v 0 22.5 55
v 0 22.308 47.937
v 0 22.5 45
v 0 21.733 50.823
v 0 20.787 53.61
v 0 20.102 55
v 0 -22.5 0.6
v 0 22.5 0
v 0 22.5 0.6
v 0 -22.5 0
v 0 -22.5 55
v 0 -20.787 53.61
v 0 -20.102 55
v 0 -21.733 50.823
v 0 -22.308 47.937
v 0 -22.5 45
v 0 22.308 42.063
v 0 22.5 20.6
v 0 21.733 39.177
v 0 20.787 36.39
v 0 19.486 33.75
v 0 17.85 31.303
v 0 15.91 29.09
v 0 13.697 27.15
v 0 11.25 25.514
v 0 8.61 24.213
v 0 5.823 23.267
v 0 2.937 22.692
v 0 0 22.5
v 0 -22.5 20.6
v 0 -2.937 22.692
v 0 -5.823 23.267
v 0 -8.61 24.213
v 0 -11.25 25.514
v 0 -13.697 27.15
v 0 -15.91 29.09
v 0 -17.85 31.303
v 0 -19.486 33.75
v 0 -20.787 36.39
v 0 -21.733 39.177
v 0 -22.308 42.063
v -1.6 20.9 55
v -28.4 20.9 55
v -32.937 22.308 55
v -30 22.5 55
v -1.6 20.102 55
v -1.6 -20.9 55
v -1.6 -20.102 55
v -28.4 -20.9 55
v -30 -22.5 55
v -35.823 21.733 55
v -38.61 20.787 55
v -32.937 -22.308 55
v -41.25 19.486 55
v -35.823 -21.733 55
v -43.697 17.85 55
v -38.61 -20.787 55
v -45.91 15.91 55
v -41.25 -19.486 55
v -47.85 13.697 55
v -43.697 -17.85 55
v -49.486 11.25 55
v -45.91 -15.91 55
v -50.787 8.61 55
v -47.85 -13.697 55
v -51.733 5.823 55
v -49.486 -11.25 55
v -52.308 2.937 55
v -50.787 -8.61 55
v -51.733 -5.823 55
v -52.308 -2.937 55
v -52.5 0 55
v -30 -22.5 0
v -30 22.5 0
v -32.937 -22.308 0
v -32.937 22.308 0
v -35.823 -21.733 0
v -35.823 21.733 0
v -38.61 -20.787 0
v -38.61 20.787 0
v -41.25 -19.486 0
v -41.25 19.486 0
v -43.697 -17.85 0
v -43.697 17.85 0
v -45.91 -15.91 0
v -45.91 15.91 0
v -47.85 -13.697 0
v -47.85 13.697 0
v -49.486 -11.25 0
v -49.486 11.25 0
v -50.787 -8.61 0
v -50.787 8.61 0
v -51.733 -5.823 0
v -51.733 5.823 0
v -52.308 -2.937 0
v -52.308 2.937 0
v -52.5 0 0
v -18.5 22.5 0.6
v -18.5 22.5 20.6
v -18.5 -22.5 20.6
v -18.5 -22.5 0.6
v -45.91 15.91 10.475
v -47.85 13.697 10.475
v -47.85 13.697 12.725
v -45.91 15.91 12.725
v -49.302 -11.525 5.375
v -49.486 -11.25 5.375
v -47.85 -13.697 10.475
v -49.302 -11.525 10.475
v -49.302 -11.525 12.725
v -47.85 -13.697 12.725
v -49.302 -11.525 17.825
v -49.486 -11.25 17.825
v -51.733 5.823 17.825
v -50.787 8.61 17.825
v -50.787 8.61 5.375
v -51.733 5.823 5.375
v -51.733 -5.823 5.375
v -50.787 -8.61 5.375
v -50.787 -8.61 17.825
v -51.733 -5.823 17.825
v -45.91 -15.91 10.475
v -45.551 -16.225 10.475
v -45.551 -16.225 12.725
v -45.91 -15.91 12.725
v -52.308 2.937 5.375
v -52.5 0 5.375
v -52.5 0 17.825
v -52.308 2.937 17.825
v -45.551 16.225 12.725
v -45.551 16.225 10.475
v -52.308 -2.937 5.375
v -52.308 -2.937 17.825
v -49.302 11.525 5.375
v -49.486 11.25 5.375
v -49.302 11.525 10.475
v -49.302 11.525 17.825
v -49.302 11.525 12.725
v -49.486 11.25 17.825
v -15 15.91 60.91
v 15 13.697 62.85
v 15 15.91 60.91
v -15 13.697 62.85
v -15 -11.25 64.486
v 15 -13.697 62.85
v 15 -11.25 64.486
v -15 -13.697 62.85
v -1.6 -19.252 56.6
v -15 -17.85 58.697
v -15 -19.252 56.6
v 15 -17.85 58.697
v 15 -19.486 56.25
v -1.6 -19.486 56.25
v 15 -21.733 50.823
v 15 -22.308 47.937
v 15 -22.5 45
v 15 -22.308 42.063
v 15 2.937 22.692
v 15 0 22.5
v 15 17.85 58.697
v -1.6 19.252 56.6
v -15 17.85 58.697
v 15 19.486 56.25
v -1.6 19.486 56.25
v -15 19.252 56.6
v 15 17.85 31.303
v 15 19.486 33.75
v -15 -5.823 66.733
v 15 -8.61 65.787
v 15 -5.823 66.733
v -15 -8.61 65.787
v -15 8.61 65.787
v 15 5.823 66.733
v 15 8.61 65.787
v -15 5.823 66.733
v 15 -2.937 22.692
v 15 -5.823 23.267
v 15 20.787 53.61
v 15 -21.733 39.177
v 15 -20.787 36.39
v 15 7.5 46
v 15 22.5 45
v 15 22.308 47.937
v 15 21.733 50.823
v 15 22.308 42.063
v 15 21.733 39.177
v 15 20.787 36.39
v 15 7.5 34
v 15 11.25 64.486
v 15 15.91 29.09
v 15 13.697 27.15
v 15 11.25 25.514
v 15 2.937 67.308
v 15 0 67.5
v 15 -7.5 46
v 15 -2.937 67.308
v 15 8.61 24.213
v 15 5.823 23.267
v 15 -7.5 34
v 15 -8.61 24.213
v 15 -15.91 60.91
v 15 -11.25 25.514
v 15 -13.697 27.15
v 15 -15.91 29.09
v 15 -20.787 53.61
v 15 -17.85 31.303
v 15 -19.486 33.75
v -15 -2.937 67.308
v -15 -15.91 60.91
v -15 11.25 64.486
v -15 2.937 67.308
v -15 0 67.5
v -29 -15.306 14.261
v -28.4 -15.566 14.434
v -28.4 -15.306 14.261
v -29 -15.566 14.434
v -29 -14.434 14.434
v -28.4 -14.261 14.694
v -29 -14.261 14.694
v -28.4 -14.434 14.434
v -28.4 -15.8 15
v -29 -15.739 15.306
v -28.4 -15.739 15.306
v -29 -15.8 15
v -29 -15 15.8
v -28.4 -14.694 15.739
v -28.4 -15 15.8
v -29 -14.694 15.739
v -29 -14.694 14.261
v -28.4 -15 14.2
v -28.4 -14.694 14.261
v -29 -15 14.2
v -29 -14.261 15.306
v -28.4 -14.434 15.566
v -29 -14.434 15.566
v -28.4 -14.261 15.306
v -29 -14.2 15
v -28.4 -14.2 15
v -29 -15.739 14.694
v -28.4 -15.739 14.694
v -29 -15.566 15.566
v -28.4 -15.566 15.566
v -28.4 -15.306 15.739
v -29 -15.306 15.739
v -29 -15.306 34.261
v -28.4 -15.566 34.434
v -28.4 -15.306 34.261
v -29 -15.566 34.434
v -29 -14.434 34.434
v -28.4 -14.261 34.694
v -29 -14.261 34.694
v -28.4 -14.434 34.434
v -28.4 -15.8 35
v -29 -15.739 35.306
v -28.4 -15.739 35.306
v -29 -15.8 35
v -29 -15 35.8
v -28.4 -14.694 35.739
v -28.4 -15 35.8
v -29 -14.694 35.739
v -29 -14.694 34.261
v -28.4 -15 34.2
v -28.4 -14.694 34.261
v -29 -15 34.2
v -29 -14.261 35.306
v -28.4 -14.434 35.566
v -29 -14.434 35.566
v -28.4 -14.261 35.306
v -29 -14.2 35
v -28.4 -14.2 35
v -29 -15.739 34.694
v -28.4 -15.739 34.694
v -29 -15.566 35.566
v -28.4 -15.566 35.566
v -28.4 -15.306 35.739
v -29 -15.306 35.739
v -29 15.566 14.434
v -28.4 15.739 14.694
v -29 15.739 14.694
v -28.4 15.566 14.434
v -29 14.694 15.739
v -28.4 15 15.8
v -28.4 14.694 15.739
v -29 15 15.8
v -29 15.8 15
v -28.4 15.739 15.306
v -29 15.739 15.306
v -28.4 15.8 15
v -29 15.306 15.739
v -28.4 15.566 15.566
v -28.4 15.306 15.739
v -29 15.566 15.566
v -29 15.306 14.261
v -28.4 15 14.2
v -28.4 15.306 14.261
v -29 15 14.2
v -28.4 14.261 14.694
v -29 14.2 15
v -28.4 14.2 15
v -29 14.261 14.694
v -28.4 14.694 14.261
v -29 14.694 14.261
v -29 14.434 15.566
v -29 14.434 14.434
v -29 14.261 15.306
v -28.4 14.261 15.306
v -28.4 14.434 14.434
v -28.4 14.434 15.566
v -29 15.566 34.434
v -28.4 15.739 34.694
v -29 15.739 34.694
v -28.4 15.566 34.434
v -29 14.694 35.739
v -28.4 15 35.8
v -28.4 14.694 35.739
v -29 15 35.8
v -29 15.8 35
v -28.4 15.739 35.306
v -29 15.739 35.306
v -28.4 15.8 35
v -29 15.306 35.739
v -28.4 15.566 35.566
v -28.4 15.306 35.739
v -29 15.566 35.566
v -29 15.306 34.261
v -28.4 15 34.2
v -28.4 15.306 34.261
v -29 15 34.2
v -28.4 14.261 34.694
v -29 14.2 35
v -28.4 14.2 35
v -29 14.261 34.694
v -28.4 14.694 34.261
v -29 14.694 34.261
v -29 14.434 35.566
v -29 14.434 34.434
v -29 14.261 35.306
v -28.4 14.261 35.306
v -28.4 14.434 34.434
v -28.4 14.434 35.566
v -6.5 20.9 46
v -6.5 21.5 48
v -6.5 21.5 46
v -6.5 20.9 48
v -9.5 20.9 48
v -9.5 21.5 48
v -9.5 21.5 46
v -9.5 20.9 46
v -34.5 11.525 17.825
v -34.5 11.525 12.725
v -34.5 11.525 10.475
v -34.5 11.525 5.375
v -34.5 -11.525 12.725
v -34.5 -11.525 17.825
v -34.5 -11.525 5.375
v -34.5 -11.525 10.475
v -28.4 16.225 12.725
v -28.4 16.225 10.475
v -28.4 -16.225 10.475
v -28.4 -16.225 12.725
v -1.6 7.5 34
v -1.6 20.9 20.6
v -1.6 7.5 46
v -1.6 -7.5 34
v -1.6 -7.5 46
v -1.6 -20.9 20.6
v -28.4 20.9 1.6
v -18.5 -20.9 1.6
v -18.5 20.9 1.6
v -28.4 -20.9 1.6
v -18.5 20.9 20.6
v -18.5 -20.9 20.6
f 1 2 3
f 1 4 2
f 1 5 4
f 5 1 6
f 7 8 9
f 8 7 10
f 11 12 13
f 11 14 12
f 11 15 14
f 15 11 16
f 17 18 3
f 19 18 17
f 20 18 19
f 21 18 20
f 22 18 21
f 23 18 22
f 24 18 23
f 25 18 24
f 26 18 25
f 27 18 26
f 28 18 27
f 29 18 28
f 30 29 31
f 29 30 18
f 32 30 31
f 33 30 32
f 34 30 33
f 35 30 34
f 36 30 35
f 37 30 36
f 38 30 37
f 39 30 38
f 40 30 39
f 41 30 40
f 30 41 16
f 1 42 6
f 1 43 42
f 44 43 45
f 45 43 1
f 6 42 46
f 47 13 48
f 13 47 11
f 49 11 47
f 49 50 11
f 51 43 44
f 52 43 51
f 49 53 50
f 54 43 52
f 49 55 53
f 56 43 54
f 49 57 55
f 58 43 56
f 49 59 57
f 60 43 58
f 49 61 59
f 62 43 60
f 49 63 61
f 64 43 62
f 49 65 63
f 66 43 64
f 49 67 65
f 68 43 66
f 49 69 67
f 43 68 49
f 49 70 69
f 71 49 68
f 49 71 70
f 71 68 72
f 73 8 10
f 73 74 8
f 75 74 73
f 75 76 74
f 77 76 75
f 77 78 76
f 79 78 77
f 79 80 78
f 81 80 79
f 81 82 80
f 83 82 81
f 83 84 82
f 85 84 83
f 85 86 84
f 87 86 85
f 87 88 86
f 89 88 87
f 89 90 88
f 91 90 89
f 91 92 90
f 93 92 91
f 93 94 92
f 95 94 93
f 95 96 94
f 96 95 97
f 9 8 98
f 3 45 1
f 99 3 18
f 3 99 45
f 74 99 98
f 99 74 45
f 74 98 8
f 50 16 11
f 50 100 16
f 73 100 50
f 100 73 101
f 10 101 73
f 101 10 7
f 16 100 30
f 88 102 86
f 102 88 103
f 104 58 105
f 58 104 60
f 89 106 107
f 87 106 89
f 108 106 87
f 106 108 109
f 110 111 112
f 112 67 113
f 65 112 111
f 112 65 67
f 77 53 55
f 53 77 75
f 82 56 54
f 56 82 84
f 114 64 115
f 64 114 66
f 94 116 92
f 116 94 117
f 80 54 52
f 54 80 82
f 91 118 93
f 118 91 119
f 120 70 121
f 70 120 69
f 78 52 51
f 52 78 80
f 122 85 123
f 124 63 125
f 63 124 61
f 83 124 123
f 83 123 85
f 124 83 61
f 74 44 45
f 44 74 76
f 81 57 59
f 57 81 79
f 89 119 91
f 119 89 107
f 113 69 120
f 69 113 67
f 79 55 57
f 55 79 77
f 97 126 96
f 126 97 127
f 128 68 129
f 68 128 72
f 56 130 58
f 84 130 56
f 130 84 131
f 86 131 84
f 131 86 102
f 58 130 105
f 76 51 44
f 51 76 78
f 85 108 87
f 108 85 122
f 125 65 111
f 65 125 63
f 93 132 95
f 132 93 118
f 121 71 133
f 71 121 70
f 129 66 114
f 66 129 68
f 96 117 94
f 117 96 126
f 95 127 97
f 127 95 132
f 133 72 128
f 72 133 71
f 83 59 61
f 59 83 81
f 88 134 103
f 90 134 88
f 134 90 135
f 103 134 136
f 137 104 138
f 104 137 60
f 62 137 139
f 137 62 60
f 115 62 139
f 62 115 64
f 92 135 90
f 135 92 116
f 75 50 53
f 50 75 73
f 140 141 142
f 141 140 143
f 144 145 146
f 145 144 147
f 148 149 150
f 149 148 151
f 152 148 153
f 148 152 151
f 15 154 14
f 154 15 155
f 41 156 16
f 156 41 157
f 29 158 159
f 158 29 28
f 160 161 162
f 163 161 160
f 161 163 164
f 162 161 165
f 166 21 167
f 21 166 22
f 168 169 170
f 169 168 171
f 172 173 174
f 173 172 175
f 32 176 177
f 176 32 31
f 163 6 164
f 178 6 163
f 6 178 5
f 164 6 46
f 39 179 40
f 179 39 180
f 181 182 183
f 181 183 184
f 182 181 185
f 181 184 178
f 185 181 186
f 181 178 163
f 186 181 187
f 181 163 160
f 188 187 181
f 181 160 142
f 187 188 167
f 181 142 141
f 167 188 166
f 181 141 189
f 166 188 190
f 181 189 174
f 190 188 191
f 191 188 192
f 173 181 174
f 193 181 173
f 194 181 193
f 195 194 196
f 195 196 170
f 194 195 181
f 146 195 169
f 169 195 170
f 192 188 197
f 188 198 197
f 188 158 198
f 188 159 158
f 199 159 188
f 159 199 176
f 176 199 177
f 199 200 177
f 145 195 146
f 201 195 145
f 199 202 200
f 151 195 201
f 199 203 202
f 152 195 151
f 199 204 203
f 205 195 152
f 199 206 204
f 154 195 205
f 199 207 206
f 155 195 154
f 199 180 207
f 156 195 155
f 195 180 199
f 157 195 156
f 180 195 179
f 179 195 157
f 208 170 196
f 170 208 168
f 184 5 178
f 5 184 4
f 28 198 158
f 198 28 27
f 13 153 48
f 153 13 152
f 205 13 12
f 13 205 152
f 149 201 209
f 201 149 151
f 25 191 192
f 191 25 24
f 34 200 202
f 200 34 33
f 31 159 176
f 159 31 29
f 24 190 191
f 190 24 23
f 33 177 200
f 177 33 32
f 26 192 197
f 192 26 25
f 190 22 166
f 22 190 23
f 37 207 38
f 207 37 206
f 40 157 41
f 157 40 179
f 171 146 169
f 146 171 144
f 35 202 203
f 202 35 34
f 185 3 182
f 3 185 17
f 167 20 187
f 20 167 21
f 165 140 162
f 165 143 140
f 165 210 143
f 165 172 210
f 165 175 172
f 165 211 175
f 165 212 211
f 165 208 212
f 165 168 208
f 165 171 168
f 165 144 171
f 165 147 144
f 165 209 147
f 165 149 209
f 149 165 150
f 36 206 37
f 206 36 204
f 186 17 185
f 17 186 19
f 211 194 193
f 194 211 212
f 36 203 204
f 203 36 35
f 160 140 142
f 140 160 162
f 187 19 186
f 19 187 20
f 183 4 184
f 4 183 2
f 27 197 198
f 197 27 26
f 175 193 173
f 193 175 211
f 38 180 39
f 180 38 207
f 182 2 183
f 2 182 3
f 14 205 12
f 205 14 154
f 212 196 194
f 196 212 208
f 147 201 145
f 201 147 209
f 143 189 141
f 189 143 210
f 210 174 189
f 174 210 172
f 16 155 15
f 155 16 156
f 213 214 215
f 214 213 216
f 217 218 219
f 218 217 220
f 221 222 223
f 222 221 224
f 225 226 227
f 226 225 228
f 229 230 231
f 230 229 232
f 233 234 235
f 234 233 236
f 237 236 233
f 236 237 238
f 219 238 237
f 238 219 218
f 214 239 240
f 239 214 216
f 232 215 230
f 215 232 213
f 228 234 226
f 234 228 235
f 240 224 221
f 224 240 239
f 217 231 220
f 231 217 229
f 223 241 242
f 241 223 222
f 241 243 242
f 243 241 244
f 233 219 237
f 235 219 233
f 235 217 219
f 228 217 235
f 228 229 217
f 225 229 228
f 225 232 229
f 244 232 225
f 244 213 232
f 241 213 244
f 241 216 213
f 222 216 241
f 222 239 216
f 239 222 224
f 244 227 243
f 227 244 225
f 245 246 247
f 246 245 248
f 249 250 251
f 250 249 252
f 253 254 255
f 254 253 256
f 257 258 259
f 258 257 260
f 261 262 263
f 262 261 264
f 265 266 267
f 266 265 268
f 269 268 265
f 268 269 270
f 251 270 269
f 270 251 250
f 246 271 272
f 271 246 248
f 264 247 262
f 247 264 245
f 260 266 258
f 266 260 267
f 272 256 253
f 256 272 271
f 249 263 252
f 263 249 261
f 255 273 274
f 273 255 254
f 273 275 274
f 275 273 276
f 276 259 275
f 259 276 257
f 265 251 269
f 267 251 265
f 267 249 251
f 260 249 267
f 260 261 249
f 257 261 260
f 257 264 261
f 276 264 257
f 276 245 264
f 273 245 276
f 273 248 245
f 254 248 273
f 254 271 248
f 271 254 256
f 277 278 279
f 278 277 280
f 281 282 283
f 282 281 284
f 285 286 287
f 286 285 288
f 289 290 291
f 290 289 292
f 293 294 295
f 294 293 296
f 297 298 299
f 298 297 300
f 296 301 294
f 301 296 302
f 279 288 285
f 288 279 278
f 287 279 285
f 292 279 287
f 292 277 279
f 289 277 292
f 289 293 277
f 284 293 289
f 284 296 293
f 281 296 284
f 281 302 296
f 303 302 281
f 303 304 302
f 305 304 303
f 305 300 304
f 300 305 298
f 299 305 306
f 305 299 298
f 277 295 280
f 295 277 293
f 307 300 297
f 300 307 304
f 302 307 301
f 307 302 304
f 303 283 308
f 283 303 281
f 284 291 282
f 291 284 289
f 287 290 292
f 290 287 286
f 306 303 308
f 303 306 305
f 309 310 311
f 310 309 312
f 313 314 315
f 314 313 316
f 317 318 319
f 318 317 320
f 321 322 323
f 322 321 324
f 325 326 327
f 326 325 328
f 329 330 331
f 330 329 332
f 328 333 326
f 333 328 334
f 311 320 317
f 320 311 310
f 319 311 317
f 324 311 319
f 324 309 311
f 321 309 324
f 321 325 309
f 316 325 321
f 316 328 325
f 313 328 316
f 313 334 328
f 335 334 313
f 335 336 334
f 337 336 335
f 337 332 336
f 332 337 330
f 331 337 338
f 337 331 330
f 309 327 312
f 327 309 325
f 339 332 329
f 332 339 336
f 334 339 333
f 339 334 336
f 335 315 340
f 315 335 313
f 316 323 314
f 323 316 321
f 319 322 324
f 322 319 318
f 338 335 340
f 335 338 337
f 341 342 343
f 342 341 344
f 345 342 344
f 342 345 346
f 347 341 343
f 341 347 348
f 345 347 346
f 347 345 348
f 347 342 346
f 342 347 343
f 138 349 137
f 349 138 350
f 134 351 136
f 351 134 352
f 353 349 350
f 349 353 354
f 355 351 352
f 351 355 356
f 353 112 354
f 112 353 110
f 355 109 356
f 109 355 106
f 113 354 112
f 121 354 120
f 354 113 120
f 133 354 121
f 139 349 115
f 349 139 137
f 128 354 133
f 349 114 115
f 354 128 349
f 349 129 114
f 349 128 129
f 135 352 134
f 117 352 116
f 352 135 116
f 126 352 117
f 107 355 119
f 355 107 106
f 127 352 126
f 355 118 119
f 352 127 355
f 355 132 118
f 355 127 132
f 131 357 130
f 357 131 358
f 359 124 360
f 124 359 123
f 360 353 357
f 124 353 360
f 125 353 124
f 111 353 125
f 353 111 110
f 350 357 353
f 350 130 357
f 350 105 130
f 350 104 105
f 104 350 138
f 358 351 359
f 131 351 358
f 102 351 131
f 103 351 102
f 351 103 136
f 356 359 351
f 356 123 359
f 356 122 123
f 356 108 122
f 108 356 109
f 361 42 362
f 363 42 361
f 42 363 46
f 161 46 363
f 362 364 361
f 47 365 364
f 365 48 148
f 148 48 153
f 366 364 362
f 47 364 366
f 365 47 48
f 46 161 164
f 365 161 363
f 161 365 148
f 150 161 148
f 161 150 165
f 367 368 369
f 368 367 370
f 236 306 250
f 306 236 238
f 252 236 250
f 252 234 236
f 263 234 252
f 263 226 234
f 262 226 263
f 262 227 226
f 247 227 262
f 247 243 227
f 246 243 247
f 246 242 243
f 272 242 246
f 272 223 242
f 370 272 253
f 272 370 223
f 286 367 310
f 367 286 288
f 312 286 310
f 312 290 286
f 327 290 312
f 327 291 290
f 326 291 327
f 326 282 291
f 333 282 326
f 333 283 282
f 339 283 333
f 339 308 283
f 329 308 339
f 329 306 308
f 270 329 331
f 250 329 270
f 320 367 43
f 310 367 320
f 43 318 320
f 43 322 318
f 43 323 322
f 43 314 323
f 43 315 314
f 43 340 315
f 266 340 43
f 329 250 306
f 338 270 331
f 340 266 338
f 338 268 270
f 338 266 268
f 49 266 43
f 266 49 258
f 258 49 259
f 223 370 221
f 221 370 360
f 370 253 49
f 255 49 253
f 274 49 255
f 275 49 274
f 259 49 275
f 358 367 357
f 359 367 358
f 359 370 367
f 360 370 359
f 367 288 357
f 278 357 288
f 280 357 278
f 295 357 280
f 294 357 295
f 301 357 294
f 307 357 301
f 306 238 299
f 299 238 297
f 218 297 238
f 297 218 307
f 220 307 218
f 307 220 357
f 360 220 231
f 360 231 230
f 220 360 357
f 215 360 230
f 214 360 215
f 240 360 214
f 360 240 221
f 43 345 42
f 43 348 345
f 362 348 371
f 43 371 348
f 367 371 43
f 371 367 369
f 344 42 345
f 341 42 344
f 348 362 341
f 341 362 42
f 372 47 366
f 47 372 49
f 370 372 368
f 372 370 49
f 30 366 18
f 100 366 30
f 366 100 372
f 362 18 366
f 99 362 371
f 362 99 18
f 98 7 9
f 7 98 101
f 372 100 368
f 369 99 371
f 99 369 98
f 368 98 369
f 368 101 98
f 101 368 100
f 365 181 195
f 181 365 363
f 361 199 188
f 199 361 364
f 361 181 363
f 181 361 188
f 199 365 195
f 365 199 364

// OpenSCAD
// file: config.scad
// PenguinBot - Print Configuration & Shared Utilities
// Units: mm | Tolerance for 3D printed parts

// ===== Print Parameters =====
LAYER_HEIGHT = 0.12;  // Appearance parts
WALL_THICKNESS = 1.6; // 3 perimeters @ 0.4mm nozzle → 1.2mm, add safety margin
CLEARANCE = 0.15;     // Hole compensation for FDM
TIGHT_FIT = 0.05;     // Press-fit tolerance
SLIP_FIT = 0.25;      // Sliding fit tolerance

// ===== MG90S Servo Dimensions =====
SERVO_BODY_W = 22.8;
SERVO_BODY_H = 12.2;
SERVO_BODY_D = 29.5;
SERVO_FLANGE_W = 32.2;
SERVO_FLANGE_H = 2.0;
SERVO_MOUNT_HOLE_SPACING = 27.0;
SERVO_MOUNT_HOLE_D = 2.0 + CLEARANCE;
SERVO_SPLINE_D = 4.8;
SERVO_SPLINE_OFFSET = 10.0;  // Spline center from top edge

// ===== N20 Motor Dimensions =====
N20_BODY_D = 24.4;
N20_BODY_L = 13.0;
N20_GEARBOX_D = 24.4;
N20_GEARBOX_L = 12.0;
N20_SHAFT_D = 3.0;
N20_SHAFT_L = 12.0;
N20_MOUNT_HOLE_SPACING = 17.0;
N20_MOUNT_HOLE_D = 2.5;

// ===== AS5600 Encoder =====
AS5600_PCB_W = 16.0;
AS5600_PCB_H = 12.7;
AS5600_PCB_T = 1.6;
MAGNET_D = 6.0;
MAGNET_H = 2.0;

// ===== Display =====
TFT_DISPLAY_W = 31.5;
TFT_DISPLAY_H = 43.5;
TFT_DISPLAY_T = 2.5;
TFT_ACTIVE_W = 24.0;
TFT_ACTIVE_H = 32.0;
TFT_PCB_W = 36.0;
TFT_PCB_H = 52.0;

// ===== Battery 2S 1500mAh (typical) =====
BATTERY_W = 35.0;
BATTERY_H = 18.0;
BATTERY_D = 70.0;

// ===== General Dimensions =====
BODY_W = 60.0;
BODY_D = 45.0;
BODY_H = 55.0;
HEAD_DIAMETER = 55.0;
HEAD_H = 40.0;
LEG_UPPER_L = 28.0;
LEG_LOWER_L = 32.0;
WHEEL_DIAMETER = 45.0;
WHEEL_WIDTH = 12.0;
ROBOT_TOTAL_H = 155.0;

// M2 / M3 fastener clearances
M2_CLEAR = 2.2;
M2_TAP = 1.6;
M2_NUT_D = 4.5;
M2_NUT_H = 1.8;
M3_CLEAR = 3.3;
M3_TAP = 2.5;

// ===== Utility Modules =====
module servo_cutout() {
    // Main body
    translate([0, 0, -SERVO_BODY_D/2])
        cube([SERVO_BODY_W + SLIP_FIT, SERVO_BODY_H + SLIP_FIT, SERVO_BODY_D + 1], center=true);
    // Flange
    translate([0, 0, -SERVO_FLANGE_H/2])
        cube([SERVO_FLANGE_W + SLIP_FIT, SERVO_FLANGE_H + SLIP_FIT, SERVO_BODY_D], center=true);
    // Mounting holes
    for (x = [-1, 1])
        translate([x * SERVO_MOUNT_HOLE_SPACING/2, 0, -SERVO_BODY_D/2])
            cylinder(d=SERVO_MOUNT_HOLE_D, h=SERVO_BODY_D + 2, center=true, $fn=16);
}

module n20_cutout() {
    union() {
        // Motor body
        cylinder(d=N20_BODY_D + SLIP_FIT, h=N20_BODY_L + 1, center=true, $fn=32);
        // Gearbox
        translate([0, 0, N20_BODY_L/2 + N20_GEARBOX_L/2])
            cylinder(d=N20_GEARBOX_D + SLIP_FIT, h=N20_GEARBOX_L + 0.5, center=true, $fn=32);
        // Mount holes
        for (x = [-1, 1])
            translate([x * N20_MOUNT_HOLE_SPACING/2, 0, 0])
                cylinder(d=N20_MOUNT_HOLE_D + CLEARANCE, h=30, center=true, $fn=16);
    }
}

// counterbore for M2 flat head screw
module m2_counterbore(length=10) {
    union() {
        cylinder(d=M2_CLEAR, h=length, center=false, $fn=16);
        translate([0, 0, length - 2.5])
            cylinder(d=4.5, h=3, center=false, $fn=16);
    }
}

// Hex nut trap (horizontal)
module m2_nut_trap() {
    cylinder(d=M2_NUT_D + 0.15, h=M2_NUT_H + 0.1, $fn=6);
}
// main file
// PenguinBot - Main Body Shell
// Left and right halves, clamshell design
include <config.scad>

module body_half(is_left=true) {
    difference() {
        union() {
            // Main half-shell
            translate([is_left ? -BODY_W/4 : BODY_W/4, 0, BODY_H/2])
                cube([BODY_W/2, BODY_D, BODY_H], center=true);

            // Rounded outer corners
            translate([is_left ? -BODY_W/2 : BODY_W/2, 0, BODY_H/2])
                cylinder(d=BODY_D, h=BODY_H, center=true, $fn=48);

            // Top dome transition (to head)
            translate([0, 0, BODY_H - 10])
                rotate([0, 90, 0])
                cylinder(d=BODY_D, h=BODY_W/2, center=true, $fn=48);
        }

        // Hollow interior
        translate([is_left ? -BODY_W/4 : BODY_W/4, 0, BODY_H/2 + WALL_THICKNESS])
            cube([BODY_W/2 - WALL_THICKNESS*2, BODY_D - WALL_THICKNESS*2, BODY_H], center=true);

        // Battery compartment (bottom)
        translate([0, 0, WALL_THICKNESS + BATTERY_H/2])
            cube([BATTERY_W + 2, BATTERY_D + 2, BATTERY_H + 2], center=true);

        // PCB mounting bosses
        for (y = [-15, 15])
            for (z = [15, 35])
                translate([is_left ? -BODY_W/2 + 6 : BODY_W/2 - 6, y, z])
                    rotate([0, 90, 0])
                    cylinder(d=M2_TAP, h=10, center=true, $fn=16);

        // Wiring pass-through (top)
        translate([0, 0, BODY_H - 15])
            cube([BODY_W/2 + 2, 15, 12], center=true);

        // Charging port cutout (bottom)
        translate([0, BODY_D/2 + 1, 12])
            rotate([90, 0, 0])
            cylinder(d=10, h=5, center=true, $fn=32);

        // Power switch cutout
        translate([is_left ? 15 : -15, -BODY_D/2 - 1, 12])
            rotate([90, 0, 0])
            cube([12, 8, 5], center=true);

        // Screw bosses (M2 self-tapping)
        for (y = [-BODY_D/2 + 8, BODY_D/2 - 8])
            for (z = [8, BODY_H - 8])
                translate([is_left ? -BODY_W/4 : BODY_W/4, y, z])
                    rotate([0, 90, 0])
                    cylinder(d=M2_TAP, h=15, center=true, $fn=16);

        // Ventilation slots (top rear)
        for (i = [0:4])
            translate([is_left ? -8 : 8, -BODY_D/2 + 10 + i*8, BODY_H - 8])
                cube([3, 4, 2], center=true);

        // Hip servo mount (bottom sides)
        for (side = [-1, 1])
            translate([side * (BODY_W/2 + 5), 0, WALL_THICKNESS + 10])
                rotate([90, 0, 90])
                servo_cutout();
    }
}

// Generate both halves
module body_left()  { body_half(true); }
module body_right() { body_half(false); }

// Assembly helper
module body_assembly() {
    color("DimGray") body_left();
    color("Gray") body_right();
}

// Bottom cover
module bottom_cover() {
    difference() {
        cube([BODY_W - 2, BODY_D - 2, 3], center=true);

        // Screw holes
        for (x = [-BODY_W/2 + 8, BODY_W/2 - 8])
            for (y = [-BODY_D/2 + 8, BODY_D/2 - 8])
                translate([x, y, 0])
                    cylinder(d=M2_CLEAR, h=6, center=true, $fn=16);

        // Charging port cutout
        translate([0, BODY_D/2 - 3, 0])
            cylinder(d=10, h=6, center=true, $fn=32);

        // Power switch slot
        translate([15, -BODY_D/2 + 3, 0])
            cube([13, 9, 6], center=true);
    }
}

// Preview
body_left();
// body_right();
// bottom_cover();
